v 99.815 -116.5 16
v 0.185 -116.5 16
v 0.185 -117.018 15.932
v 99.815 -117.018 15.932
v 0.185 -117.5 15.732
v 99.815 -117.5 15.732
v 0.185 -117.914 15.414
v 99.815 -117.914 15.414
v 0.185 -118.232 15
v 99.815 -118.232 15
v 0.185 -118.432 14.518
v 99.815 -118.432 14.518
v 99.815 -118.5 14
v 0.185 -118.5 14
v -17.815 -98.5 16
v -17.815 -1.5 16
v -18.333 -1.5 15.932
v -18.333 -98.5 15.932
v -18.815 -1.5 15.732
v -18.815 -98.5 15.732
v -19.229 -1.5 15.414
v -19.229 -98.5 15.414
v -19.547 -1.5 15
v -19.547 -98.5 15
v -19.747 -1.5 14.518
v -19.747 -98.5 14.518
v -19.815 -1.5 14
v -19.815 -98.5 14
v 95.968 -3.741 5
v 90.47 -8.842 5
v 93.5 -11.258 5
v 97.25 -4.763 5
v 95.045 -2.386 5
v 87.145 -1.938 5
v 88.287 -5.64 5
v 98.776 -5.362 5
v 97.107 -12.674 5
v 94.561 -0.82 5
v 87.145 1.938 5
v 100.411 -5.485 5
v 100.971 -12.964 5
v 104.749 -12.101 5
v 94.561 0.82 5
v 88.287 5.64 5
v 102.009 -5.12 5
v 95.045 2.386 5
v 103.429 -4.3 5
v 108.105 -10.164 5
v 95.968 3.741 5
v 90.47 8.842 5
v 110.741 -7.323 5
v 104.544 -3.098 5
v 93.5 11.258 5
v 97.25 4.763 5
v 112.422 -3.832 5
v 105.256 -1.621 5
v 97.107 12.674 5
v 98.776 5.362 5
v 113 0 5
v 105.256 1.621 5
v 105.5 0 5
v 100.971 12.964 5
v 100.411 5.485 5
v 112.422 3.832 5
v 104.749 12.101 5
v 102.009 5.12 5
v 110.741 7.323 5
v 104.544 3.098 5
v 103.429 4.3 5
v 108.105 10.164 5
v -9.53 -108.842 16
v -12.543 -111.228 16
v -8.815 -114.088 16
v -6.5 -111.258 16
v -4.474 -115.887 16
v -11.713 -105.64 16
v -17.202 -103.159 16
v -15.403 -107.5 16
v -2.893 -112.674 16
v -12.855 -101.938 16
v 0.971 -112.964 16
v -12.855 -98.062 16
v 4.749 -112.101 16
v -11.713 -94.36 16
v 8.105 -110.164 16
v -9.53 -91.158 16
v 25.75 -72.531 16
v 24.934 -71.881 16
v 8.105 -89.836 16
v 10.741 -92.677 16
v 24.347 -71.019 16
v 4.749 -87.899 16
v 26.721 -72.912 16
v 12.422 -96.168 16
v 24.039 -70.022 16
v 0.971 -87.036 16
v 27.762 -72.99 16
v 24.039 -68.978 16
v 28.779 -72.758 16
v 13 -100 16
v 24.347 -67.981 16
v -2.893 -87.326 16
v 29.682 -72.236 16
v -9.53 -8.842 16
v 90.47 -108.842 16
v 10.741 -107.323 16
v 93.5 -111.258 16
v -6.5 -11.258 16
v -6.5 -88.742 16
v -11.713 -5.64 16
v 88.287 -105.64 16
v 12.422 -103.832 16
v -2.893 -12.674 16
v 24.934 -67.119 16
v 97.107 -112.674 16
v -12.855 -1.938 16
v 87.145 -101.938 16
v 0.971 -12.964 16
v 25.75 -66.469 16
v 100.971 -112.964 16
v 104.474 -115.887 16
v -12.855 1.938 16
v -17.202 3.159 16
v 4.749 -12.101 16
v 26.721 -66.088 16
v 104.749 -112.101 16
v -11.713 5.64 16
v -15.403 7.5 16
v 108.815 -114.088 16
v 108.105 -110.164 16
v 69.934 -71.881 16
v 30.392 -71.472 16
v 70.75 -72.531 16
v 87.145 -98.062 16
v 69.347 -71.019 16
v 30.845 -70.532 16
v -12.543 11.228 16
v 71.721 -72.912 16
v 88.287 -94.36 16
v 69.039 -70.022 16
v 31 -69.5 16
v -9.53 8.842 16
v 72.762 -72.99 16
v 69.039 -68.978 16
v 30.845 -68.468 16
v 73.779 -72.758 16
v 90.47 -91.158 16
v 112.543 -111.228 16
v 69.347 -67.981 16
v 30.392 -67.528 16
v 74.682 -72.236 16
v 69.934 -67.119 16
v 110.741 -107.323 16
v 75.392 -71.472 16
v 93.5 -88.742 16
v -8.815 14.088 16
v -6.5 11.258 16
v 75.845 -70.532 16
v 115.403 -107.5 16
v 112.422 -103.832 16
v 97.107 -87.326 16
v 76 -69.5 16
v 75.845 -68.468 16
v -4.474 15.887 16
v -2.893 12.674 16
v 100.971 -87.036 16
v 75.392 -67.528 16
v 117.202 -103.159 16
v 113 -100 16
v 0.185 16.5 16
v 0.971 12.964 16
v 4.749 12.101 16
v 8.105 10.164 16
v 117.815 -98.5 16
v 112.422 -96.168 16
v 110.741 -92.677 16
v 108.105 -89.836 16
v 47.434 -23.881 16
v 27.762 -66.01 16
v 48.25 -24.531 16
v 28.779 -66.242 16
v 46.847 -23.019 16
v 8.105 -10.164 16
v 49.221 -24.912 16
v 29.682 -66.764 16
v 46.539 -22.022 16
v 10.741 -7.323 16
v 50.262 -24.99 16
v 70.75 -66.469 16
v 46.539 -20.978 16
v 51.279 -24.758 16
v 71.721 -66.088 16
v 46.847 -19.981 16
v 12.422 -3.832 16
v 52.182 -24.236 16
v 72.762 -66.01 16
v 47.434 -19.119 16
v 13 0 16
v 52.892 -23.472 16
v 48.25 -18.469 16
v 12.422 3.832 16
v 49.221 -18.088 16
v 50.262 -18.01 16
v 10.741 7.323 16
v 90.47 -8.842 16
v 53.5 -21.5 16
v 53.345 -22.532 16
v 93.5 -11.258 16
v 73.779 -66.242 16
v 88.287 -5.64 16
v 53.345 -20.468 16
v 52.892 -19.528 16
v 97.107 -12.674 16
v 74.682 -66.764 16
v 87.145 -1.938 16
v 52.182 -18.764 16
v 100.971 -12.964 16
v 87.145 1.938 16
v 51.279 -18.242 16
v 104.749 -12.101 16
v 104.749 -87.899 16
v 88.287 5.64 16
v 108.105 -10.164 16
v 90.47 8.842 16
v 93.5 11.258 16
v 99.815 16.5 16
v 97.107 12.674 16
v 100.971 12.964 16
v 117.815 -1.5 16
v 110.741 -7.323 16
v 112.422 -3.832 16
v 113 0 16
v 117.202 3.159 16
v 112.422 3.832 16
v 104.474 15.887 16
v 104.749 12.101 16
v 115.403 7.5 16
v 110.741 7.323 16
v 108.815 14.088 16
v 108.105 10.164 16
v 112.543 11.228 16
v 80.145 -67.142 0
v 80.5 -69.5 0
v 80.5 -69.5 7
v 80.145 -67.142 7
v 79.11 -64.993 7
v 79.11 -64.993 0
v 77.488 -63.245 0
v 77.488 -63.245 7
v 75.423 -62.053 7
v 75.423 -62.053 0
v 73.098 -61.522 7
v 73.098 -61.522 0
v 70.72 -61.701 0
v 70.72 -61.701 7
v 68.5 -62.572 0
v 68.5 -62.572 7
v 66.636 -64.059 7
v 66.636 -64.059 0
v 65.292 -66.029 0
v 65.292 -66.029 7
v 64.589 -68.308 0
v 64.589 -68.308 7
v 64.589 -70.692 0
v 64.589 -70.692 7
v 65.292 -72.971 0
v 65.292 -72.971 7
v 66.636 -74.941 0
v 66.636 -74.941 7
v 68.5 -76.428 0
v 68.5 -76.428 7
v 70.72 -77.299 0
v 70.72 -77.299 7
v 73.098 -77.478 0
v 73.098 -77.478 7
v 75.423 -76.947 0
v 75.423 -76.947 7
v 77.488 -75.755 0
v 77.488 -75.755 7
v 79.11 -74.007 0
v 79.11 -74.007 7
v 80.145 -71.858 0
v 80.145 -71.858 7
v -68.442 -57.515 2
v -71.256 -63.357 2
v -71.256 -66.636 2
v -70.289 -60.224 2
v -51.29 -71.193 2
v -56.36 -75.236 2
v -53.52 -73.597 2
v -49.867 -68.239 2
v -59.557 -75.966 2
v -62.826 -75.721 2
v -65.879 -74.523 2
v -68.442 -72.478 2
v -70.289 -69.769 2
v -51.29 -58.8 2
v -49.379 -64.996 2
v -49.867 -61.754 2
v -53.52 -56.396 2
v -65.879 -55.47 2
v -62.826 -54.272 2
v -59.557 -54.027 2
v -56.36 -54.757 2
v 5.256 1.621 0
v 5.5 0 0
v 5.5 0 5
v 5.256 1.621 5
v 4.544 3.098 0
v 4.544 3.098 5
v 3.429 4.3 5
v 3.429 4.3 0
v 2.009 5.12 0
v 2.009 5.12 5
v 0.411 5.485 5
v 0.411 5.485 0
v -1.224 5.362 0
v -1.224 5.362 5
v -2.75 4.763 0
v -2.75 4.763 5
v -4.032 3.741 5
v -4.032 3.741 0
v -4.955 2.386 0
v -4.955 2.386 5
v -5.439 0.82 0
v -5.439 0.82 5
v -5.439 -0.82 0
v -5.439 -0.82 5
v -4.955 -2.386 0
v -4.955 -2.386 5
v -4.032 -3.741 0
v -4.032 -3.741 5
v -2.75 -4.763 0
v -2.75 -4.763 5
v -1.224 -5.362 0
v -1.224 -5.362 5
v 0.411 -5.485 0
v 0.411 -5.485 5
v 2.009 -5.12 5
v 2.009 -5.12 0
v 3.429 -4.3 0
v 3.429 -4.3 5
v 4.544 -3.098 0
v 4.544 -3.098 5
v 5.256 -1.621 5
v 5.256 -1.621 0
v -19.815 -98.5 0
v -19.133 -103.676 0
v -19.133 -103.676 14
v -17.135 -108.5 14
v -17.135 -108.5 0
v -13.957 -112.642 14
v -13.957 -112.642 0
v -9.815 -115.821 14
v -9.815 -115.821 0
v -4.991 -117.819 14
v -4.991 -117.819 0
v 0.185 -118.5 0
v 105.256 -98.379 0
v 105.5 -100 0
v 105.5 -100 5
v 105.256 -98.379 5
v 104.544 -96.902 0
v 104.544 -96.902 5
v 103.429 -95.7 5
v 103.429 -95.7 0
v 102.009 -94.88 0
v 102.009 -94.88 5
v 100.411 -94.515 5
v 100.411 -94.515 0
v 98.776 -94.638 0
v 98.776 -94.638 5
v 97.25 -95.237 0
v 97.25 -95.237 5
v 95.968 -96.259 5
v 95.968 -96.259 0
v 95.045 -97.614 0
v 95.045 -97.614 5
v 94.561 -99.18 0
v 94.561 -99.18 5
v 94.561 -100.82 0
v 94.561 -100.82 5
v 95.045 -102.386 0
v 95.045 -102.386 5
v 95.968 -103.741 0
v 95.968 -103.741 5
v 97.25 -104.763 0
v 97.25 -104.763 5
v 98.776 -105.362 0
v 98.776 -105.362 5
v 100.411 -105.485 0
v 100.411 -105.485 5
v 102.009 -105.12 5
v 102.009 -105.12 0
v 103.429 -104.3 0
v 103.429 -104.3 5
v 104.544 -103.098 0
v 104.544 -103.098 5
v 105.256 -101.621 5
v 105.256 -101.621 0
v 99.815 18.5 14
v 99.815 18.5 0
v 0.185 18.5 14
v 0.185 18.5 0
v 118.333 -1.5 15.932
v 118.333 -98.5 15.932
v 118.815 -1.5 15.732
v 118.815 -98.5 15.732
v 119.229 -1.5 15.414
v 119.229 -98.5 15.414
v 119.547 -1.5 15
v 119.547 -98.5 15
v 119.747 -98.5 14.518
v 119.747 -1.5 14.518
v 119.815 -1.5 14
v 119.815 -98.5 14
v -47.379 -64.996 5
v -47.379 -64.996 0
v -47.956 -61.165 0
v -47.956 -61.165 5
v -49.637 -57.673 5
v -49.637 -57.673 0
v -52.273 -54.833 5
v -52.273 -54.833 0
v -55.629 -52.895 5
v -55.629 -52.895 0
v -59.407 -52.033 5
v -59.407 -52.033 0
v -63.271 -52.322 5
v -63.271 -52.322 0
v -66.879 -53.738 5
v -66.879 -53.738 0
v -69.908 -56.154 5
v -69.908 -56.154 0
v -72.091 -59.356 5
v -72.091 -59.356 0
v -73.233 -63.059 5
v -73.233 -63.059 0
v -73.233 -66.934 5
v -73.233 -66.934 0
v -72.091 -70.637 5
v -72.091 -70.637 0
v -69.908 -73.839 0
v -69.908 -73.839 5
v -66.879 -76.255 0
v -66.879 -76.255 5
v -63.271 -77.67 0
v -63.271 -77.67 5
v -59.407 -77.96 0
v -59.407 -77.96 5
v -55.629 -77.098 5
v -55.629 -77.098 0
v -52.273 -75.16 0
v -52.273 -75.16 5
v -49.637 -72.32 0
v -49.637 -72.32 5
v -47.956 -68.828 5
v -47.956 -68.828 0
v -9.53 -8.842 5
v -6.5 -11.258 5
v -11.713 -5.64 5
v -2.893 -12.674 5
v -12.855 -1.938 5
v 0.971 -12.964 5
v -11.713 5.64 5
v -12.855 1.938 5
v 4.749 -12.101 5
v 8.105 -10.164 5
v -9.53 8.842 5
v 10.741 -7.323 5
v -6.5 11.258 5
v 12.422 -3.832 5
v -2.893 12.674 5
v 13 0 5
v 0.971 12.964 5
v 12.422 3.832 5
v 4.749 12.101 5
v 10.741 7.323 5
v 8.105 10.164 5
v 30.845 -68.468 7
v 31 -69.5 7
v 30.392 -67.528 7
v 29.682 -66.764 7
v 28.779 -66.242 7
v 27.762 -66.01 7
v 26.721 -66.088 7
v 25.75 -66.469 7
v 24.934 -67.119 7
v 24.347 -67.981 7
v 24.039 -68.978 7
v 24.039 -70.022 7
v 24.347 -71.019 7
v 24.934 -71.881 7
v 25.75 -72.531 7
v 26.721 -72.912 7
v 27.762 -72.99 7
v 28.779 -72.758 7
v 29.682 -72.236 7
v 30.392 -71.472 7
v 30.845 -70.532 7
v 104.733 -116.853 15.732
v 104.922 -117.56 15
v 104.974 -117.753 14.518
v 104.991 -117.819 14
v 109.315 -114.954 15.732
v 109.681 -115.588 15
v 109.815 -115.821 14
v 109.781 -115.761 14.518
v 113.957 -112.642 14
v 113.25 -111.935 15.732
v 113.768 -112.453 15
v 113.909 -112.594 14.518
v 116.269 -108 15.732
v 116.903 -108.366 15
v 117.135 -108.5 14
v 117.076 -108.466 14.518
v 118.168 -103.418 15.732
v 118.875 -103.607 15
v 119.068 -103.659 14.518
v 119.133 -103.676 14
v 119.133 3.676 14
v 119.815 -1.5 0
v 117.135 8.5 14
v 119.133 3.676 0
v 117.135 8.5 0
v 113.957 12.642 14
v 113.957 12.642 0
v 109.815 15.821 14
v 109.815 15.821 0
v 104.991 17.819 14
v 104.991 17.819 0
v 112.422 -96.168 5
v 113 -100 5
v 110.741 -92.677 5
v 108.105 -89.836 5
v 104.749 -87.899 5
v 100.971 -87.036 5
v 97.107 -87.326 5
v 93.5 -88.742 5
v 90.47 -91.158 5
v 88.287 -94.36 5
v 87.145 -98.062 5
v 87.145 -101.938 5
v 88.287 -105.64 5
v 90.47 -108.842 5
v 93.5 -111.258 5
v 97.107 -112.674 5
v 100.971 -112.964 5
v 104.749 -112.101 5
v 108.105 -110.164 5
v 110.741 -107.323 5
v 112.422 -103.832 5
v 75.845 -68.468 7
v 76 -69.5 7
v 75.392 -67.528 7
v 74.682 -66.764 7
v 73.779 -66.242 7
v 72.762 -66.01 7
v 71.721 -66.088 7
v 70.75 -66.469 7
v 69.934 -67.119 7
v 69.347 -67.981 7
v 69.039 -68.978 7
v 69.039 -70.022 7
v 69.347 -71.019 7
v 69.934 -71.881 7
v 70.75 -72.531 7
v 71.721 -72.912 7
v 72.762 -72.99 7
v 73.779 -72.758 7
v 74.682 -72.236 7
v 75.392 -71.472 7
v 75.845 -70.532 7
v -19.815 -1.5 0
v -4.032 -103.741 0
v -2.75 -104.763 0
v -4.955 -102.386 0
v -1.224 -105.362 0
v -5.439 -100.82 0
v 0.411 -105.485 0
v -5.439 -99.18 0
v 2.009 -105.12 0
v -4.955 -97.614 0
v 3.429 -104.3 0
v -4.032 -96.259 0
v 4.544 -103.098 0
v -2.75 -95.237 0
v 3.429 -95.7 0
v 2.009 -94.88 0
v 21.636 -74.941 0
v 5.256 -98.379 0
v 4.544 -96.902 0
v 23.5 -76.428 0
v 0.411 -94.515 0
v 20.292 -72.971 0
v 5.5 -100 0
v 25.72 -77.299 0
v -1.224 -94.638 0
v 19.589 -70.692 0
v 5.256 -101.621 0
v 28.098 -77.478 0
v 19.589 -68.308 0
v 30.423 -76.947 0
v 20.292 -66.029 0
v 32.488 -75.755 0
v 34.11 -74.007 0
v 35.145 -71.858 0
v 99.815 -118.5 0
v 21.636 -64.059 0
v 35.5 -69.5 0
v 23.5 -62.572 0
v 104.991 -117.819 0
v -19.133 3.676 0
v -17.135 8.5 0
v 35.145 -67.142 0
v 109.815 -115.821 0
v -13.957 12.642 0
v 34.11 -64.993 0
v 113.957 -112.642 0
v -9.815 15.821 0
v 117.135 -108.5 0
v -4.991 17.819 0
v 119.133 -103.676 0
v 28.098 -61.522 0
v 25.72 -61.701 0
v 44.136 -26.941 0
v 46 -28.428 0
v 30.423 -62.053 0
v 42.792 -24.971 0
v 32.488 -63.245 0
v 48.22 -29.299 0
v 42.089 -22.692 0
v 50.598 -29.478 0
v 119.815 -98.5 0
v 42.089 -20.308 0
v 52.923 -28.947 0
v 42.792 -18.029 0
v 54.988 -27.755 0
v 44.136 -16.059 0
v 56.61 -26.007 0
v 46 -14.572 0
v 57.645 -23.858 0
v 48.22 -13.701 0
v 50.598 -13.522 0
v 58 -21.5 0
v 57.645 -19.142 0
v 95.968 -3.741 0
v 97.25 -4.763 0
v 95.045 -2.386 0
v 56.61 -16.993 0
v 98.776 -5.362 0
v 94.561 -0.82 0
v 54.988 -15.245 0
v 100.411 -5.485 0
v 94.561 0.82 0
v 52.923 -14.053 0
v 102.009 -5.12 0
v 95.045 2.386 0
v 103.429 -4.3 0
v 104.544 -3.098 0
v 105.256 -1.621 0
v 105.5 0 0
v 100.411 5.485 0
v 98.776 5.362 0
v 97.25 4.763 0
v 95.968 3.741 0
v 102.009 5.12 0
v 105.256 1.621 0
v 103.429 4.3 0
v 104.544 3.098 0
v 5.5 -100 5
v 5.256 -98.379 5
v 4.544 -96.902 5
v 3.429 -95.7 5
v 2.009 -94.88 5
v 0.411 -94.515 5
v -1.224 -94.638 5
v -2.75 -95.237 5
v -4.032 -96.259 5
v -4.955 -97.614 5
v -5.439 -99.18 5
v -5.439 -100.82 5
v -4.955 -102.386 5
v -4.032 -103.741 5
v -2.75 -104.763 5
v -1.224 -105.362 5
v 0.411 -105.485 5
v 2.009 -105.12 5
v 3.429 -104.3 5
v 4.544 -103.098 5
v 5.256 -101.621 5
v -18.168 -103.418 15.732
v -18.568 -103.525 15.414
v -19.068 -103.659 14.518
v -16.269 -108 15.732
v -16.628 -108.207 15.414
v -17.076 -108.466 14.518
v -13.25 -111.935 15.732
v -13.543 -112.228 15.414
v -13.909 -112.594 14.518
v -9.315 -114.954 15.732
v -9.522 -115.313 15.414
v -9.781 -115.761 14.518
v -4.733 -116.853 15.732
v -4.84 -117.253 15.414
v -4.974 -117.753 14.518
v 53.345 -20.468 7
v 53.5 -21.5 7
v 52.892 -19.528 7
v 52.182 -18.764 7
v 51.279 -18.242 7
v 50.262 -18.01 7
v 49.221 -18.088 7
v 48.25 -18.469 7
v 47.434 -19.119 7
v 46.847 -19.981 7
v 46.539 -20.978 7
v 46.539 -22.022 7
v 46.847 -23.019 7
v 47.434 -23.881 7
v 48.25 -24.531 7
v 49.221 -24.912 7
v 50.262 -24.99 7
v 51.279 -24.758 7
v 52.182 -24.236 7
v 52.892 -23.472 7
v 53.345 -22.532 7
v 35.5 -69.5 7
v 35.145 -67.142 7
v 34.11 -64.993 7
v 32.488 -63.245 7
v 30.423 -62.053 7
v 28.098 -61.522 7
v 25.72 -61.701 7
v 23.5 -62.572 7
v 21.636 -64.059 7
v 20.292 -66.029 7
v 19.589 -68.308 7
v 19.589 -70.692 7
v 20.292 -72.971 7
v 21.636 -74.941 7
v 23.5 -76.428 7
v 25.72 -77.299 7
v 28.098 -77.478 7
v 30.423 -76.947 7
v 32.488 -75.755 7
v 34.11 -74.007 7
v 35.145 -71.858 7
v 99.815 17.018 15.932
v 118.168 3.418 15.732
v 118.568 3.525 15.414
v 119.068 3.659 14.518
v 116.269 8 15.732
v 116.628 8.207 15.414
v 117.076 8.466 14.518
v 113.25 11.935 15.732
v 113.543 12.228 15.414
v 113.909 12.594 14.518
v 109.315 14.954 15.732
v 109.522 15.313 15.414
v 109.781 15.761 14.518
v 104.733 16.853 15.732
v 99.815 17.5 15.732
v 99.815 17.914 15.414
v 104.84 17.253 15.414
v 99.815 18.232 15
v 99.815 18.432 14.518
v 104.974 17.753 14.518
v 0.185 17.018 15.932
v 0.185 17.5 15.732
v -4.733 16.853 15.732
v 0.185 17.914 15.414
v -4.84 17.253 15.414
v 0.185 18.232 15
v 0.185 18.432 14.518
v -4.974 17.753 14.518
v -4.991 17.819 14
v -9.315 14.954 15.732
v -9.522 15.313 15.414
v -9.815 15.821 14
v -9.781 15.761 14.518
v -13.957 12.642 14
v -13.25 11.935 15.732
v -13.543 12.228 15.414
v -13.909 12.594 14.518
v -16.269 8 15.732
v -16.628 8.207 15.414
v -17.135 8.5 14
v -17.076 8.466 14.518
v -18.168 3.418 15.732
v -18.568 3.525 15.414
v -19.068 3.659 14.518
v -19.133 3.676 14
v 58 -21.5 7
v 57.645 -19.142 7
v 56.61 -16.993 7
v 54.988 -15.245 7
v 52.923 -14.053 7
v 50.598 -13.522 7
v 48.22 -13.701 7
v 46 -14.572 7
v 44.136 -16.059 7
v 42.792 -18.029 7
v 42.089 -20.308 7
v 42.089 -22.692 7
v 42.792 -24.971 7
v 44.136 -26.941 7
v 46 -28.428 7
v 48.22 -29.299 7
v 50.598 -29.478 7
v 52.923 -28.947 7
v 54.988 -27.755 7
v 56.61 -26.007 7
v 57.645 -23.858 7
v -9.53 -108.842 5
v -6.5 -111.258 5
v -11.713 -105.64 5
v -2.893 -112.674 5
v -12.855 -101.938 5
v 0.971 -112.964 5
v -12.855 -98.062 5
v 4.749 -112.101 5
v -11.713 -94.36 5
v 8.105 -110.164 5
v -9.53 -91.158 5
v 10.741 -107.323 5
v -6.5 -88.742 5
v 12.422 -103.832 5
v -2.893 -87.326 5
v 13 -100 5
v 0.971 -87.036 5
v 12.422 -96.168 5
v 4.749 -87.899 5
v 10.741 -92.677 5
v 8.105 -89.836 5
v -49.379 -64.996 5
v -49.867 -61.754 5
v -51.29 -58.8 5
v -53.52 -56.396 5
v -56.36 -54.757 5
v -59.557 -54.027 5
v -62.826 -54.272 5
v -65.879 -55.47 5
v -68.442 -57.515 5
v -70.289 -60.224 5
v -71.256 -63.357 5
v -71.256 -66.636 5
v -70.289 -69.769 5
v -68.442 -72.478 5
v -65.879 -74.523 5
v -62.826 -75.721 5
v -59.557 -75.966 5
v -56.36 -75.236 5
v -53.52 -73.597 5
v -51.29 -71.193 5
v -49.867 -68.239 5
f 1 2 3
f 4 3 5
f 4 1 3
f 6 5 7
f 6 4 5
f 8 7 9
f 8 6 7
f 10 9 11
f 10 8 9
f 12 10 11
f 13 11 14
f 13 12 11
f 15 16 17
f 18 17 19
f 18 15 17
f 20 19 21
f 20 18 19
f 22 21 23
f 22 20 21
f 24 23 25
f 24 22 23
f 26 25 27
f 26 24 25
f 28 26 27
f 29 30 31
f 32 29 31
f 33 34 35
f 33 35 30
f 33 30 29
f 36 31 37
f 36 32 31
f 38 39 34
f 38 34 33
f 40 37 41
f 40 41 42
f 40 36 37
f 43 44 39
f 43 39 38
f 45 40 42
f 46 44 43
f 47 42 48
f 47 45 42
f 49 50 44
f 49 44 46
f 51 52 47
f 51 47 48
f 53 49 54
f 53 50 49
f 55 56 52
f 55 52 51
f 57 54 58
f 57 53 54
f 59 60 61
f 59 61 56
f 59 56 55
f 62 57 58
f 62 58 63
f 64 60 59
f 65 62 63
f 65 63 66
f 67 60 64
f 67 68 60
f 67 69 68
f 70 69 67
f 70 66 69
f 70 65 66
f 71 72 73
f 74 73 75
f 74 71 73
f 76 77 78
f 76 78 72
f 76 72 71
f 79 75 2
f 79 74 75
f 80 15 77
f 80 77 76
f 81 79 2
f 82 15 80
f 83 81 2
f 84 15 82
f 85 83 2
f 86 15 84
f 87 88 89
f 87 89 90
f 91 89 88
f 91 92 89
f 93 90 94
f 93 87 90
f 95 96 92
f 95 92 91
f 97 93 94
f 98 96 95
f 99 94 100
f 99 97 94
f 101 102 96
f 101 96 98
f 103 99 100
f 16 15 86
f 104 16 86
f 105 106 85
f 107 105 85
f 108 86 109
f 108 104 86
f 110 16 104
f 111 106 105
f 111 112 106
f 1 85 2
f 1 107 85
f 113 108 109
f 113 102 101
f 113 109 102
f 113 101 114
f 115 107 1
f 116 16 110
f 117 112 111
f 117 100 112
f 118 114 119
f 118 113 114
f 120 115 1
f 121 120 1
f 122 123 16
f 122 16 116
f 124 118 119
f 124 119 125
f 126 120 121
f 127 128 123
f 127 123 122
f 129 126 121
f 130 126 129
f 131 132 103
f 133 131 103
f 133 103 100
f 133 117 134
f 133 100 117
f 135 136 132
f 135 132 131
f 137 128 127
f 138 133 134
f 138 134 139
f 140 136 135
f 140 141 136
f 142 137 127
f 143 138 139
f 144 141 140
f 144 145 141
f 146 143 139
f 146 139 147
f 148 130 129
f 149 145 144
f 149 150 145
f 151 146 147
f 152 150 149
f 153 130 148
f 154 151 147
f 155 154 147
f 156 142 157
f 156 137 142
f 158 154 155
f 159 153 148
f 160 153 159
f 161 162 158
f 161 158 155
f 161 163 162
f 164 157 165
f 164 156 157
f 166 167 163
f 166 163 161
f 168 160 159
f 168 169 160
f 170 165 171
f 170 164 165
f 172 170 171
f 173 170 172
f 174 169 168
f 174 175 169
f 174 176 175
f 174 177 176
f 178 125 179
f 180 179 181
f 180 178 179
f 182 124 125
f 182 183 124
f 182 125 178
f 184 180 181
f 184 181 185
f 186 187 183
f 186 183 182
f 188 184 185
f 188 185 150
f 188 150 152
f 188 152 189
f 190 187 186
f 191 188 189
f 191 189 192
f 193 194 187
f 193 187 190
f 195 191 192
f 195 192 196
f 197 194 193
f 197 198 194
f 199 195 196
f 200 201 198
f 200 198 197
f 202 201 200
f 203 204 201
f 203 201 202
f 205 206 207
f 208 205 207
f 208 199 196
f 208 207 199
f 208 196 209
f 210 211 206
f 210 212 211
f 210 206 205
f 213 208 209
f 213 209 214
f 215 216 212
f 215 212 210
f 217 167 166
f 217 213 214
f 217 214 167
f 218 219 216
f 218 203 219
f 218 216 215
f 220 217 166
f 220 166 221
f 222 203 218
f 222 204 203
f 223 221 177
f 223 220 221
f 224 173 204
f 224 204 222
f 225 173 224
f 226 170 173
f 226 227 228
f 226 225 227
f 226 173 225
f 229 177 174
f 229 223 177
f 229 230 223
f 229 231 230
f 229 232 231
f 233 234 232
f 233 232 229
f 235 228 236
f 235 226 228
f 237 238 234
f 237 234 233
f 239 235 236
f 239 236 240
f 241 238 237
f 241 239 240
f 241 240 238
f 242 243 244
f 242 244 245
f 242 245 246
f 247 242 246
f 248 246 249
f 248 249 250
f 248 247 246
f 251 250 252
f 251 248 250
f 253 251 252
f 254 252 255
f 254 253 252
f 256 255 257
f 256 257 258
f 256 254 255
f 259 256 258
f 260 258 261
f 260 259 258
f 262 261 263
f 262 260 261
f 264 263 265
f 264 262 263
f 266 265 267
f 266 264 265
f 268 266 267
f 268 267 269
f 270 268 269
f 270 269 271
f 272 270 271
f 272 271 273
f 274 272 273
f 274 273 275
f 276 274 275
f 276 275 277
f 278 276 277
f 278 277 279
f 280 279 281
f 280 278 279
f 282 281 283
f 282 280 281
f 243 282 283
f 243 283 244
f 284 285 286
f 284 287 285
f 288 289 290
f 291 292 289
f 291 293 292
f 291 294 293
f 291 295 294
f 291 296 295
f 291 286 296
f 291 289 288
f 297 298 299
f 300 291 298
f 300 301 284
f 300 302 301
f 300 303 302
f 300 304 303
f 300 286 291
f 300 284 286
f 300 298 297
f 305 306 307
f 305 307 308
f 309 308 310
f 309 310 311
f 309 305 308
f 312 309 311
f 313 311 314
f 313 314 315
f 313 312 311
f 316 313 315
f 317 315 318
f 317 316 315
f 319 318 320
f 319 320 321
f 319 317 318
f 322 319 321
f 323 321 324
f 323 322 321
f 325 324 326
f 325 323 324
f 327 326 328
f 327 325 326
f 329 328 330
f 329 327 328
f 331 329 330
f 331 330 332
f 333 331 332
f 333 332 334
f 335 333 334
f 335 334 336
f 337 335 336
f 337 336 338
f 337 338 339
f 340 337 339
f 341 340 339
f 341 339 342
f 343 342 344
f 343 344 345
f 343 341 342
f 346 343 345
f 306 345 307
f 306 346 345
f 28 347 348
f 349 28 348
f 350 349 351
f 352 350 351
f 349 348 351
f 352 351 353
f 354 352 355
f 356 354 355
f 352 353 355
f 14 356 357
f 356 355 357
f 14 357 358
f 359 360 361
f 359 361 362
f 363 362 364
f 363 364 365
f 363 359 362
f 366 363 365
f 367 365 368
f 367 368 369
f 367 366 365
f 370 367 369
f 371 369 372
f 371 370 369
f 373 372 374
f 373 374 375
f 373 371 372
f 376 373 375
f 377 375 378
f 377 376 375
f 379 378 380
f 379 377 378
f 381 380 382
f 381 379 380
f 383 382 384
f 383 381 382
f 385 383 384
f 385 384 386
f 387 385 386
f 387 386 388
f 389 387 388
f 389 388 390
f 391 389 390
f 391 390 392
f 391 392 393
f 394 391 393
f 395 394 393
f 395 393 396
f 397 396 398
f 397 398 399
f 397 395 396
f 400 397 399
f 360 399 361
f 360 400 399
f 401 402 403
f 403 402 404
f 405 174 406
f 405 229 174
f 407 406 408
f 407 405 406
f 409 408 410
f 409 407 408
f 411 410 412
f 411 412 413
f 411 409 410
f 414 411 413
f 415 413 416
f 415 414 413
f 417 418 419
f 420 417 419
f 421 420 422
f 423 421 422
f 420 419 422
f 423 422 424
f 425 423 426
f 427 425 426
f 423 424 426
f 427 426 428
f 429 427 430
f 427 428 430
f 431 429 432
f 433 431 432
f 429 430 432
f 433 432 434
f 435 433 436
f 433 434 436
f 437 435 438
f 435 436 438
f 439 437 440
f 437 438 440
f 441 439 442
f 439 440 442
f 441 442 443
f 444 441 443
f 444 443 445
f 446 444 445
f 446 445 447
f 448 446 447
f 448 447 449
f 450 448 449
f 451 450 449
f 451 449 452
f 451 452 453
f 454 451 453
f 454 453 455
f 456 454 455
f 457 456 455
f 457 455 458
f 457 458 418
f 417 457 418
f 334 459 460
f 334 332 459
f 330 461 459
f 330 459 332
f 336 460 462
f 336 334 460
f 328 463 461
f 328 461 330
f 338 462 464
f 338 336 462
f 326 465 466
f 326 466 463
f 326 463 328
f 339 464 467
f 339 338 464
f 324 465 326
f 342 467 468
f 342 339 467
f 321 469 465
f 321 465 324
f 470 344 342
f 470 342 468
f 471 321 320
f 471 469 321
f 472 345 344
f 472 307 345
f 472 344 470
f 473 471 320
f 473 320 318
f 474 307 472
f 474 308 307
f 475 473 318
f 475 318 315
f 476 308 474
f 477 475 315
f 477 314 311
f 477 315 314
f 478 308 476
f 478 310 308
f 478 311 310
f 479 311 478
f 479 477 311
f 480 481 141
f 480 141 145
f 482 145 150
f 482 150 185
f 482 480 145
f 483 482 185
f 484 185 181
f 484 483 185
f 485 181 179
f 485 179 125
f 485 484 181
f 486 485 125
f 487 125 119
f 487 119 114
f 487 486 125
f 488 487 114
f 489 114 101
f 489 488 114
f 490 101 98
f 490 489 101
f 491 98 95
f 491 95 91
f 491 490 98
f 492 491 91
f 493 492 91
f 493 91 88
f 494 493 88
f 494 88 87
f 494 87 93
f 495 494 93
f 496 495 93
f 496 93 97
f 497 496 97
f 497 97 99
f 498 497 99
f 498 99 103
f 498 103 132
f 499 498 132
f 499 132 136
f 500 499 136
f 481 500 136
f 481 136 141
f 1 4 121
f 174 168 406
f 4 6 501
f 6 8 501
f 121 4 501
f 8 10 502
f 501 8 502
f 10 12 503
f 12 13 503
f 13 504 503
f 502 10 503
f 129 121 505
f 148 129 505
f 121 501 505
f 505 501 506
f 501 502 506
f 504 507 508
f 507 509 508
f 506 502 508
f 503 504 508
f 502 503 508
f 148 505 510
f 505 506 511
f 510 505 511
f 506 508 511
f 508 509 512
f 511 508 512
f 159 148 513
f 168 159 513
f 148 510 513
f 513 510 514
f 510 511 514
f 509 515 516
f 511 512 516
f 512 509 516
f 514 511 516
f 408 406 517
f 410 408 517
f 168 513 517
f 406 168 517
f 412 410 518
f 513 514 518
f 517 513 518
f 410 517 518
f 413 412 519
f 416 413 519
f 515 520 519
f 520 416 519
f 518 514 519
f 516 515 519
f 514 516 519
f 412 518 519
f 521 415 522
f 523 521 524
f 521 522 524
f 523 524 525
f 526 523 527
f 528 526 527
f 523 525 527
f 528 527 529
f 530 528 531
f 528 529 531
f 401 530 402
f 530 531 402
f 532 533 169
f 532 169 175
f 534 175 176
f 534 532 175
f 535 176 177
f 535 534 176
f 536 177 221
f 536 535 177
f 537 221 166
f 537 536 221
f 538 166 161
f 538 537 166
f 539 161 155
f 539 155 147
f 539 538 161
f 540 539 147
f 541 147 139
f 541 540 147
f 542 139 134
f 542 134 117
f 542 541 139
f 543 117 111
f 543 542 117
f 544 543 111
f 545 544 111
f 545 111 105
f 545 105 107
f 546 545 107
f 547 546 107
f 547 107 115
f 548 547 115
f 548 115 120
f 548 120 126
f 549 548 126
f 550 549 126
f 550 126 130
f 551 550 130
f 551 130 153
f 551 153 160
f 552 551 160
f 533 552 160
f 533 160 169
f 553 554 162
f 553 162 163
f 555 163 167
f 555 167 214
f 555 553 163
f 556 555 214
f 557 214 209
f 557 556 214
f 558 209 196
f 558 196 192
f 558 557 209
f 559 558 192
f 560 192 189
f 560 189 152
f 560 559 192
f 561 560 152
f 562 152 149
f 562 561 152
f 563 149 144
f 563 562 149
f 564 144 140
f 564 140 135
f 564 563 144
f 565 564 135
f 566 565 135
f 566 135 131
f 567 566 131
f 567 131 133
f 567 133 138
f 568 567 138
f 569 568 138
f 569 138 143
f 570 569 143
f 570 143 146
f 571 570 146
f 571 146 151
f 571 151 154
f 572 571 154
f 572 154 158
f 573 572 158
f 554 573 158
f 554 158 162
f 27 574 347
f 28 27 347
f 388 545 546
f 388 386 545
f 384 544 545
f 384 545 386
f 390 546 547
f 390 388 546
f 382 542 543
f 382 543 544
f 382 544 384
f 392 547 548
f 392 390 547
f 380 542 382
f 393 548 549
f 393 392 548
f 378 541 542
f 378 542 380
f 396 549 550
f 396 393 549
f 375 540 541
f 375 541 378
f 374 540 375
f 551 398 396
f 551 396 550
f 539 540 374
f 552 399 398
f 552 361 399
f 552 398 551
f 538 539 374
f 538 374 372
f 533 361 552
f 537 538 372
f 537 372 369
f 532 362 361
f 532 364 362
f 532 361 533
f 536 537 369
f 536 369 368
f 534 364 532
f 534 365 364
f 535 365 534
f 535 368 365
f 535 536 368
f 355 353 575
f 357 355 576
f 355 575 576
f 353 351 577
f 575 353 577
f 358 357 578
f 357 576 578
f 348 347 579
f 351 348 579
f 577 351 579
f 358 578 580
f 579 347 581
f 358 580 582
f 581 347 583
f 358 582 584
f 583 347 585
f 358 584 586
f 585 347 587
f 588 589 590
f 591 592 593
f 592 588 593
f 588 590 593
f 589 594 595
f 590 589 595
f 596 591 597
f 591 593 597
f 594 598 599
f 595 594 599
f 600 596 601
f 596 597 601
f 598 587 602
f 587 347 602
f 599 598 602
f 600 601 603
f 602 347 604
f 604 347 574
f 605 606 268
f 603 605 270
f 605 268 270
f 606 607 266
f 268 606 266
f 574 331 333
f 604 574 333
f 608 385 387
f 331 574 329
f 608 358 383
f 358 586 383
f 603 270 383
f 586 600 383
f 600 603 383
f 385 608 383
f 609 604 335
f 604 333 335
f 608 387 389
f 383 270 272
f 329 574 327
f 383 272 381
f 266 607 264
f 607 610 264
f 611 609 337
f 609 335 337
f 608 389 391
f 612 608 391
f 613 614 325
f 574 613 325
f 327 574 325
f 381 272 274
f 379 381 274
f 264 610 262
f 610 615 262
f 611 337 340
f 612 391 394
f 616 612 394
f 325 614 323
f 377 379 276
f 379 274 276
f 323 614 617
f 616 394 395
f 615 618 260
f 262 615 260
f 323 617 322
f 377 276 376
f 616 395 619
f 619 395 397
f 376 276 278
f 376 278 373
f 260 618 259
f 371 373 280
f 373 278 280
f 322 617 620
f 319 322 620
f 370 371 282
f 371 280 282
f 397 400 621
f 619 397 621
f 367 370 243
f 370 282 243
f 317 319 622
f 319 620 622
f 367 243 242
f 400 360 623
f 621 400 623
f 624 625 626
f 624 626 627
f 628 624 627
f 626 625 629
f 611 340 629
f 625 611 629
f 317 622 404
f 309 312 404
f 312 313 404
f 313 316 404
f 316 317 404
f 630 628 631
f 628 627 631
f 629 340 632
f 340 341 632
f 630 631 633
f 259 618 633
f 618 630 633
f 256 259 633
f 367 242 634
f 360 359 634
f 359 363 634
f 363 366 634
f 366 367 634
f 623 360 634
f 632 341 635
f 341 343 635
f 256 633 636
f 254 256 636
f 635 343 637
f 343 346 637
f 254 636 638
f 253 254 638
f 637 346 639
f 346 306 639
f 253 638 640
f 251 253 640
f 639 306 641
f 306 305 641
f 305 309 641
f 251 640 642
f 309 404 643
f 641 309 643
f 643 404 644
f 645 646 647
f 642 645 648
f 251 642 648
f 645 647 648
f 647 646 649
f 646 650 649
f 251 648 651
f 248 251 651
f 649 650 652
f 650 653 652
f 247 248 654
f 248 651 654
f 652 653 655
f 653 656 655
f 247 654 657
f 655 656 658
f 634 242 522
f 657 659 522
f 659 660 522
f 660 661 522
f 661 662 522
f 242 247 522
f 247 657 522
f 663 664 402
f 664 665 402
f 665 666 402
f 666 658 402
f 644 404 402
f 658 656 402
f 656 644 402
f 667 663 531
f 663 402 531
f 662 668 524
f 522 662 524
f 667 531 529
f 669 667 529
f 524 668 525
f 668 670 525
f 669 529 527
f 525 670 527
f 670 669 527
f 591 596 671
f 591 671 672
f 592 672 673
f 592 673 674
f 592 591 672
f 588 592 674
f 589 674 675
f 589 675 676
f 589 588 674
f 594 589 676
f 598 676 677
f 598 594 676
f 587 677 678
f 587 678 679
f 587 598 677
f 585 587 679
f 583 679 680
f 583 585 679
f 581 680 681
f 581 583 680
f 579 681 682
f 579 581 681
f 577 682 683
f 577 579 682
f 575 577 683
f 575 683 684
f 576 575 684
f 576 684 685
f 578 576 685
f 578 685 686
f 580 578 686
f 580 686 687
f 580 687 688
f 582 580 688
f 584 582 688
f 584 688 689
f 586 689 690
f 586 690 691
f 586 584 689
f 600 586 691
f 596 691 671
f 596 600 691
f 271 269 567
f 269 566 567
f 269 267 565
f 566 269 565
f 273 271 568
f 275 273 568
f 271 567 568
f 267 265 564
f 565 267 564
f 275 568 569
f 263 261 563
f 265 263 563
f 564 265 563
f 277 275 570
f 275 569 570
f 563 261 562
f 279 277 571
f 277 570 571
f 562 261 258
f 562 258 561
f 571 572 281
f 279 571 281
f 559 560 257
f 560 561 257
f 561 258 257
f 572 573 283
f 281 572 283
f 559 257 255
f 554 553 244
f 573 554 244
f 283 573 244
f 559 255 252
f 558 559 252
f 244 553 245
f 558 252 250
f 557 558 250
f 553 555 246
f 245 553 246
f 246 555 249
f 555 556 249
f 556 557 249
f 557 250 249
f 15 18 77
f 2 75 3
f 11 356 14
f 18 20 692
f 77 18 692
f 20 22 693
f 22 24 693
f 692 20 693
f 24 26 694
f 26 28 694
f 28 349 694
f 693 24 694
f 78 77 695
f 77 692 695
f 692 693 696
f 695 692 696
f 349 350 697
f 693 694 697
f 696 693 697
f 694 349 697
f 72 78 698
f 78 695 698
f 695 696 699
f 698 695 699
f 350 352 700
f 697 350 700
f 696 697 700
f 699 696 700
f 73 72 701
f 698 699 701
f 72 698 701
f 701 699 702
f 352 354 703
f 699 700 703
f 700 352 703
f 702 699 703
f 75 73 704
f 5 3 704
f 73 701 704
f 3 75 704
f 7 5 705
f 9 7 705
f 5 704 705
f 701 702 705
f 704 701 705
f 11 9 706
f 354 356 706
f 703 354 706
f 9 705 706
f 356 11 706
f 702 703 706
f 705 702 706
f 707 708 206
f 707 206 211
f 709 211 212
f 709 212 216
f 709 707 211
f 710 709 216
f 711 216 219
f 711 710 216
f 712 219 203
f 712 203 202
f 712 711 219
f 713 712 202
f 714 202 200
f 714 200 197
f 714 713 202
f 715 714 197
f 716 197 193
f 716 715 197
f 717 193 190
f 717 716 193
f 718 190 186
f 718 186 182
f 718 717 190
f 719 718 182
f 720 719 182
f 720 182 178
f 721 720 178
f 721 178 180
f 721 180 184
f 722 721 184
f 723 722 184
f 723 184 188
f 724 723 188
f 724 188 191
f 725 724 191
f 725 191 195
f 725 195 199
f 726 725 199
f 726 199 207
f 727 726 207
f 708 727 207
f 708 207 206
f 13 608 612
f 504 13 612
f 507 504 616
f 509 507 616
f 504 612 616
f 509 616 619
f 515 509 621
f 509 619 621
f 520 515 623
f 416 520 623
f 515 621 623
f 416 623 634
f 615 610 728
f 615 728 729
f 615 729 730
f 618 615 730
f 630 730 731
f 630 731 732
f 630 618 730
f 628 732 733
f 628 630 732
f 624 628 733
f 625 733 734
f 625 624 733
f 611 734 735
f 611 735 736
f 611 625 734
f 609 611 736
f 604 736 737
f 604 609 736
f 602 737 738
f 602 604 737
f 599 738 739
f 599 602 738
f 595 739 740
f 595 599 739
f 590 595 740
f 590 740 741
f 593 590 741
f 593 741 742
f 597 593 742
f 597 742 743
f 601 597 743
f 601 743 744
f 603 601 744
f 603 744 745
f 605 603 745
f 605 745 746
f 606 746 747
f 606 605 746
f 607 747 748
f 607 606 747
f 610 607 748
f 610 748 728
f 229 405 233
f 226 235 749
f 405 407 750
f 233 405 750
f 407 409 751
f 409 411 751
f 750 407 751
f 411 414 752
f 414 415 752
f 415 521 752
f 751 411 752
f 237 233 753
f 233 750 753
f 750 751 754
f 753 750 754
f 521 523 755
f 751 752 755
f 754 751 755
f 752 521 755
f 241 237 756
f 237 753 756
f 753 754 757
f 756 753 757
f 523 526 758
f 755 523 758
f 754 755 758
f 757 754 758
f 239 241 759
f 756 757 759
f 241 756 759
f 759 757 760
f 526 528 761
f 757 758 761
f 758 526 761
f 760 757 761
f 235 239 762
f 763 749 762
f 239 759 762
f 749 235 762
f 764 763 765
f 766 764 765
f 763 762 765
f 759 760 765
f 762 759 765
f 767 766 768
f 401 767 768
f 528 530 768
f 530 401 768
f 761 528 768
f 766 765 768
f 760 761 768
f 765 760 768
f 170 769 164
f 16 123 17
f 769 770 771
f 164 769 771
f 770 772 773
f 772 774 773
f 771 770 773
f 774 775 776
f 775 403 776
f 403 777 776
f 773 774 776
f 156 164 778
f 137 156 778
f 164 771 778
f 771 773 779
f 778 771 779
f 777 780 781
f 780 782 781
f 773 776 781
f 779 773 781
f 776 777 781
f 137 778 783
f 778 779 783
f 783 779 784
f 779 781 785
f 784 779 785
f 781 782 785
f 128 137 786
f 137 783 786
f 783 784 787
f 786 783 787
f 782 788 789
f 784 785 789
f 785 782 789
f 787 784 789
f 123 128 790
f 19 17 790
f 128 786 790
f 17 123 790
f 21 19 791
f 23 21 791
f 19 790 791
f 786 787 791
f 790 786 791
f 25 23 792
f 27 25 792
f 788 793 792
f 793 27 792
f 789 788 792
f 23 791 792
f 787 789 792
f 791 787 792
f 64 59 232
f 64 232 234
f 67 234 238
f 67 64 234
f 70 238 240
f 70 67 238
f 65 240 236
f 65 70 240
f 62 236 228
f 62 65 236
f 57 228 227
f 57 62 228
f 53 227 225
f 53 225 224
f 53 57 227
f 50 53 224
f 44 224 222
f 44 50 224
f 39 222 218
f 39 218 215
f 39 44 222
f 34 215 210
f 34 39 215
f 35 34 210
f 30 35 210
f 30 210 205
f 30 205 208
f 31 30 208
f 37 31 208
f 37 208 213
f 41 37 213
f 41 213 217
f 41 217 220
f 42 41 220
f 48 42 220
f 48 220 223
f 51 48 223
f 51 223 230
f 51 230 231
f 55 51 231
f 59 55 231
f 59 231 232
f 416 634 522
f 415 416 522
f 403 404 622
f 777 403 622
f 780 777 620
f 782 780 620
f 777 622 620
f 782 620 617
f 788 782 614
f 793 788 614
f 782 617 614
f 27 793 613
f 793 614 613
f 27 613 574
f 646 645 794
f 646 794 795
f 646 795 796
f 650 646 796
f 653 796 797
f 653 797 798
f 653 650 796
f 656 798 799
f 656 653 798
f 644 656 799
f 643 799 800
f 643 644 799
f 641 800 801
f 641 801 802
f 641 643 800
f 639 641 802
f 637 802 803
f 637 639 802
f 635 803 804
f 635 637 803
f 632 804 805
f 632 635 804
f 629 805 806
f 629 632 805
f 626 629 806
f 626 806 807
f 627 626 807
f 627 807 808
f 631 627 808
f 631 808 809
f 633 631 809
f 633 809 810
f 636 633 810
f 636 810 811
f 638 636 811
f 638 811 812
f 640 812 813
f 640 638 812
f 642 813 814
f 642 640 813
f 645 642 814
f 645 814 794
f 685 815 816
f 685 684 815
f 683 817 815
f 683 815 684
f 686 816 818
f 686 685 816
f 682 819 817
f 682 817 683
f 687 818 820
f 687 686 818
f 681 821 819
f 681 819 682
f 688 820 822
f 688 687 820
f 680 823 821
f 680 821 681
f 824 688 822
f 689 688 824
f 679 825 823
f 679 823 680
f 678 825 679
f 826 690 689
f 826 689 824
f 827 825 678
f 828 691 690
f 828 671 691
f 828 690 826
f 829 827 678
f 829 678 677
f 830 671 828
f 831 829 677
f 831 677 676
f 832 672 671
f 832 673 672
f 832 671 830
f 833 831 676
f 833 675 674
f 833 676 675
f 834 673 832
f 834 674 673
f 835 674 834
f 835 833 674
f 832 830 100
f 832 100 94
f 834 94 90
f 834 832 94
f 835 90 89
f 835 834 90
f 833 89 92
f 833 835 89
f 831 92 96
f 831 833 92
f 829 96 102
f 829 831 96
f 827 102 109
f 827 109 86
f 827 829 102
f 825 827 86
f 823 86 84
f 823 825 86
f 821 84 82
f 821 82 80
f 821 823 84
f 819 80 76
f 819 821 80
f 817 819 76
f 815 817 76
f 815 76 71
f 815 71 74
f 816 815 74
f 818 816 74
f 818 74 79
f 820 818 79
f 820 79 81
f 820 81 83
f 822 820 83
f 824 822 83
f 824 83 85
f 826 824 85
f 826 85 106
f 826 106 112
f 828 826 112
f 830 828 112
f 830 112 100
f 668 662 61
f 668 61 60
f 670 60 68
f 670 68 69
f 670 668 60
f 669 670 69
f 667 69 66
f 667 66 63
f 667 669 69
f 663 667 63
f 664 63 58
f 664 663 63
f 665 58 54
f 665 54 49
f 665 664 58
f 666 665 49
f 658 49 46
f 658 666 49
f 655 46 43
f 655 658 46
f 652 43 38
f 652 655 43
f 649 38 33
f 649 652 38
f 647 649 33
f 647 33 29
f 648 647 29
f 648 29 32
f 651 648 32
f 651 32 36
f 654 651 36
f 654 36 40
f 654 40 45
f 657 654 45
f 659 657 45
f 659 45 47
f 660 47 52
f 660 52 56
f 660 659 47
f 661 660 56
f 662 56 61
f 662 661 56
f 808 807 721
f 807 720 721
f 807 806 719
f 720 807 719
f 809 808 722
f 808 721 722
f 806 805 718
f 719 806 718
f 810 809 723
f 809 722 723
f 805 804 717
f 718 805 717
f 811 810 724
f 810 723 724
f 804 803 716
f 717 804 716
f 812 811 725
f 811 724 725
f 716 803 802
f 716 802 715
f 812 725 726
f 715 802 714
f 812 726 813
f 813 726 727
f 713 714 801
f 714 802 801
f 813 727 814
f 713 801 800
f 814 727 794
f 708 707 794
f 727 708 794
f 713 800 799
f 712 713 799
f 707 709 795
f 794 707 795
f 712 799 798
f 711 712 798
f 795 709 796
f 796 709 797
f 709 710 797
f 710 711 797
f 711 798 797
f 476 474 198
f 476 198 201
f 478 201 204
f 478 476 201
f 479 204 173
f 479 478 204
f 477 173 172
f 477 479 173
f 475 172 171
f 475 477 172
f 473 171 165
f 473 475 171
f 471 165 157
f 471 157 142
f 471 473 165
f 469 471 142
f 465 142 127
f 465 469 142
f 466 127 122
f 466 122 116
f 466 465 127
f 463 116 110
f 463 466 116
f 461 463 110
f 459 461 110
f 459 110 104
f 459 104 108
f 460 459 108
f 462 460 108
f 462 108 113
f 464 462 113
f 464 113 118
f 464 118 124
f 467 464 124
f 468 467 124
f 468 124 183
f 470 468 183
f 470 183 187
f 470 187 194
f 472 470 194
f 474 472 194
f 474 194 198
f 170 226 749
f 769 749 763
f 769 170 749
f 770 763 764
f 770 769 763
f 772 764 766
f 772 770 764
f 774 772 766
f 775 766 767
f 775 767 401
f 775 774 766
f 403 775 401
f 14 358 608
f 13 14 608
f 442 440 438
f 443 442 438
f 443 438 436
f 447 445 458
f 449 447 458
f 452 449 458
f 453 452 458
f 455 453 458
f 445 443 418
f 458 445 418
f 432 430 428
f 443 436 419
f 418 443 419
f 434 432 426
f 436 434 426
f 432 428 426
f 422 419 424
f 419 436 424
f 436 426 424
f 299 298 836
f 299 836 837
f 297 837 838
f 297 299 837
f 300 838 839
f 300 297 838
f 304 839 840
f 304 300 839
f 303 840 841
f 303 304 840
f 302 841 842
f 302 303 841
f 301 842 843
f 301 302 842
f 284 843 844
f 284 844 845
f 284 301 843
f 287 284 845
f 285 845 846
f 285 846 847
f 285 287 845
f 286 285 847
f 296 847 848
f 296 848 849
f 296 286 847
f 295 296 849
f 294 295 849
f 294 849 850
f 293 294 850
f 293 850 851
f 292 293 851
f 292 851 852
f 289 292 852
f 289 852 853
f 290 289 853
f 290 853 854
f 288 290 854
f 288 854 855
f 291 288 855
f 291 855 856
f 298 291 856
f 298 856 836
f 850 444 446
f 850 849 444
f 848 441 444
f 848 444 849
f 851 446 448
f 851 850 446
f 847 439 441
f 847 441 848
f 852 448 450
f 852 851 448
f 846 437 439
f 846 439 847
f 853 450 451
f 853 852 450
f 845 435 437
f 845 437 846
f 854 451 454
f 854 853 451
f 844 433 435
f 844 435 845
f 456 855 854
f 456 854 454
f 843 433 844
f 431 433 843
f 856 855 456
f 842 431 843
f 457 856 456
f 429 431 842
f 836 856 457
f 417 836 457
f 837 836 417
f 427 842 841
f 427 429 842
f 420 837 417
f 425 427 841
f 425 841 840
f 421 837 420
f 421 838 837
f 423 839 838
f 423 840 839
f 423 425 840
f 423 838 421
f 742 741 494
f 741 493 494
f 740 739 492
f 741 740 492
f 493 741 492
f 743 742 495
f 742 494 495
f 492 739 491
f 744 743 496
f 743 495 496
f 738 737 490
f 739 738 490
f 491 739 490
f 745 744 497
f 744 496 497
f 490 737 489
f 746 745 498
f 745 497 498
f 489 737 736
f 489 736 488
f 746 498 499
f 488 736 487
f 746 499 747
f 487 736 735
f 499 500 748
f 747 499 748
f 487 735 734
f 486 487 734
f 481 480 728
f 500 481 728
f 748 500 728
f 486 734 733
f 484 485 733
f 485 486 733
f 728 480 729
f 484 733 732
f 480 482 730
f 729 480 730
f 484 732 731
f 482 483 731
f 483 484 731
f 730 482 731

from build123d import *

# Parameters (mm, degrees)
F0_R     = 13
F0_R_2   = 8
F0_R_3   = 3.5
F1_DEPTH = 16
F2_DEPTH = 7
F3_DEPTH = 16
F4_R     = 2
F0_R_4   = 5.5
F5_DEPTH = 5
F0_R_5   = 11
F6_DEPTH = 2
F7_DEPTH = 5


# Not quite as in the source:
# - a feature names something its author has since deleted; it is built from what else it names


with BuildPart() as f1:
    # F0 (on Top) → F1 (new body)
    with BuildSketch(Plane.XY):
        with BuildLine():
            Line((99.8149545762, 18.5), (0.1850454238, 18.5))
            ThreePointArc((0.1850454238, 18.5), (-13.9570902, 12.6421356237), (-19.8149545762, -1.5))
            Line((-19.8149545762, -1.5), (-19.8149545762, -98.5))
            ThreePointArc((-19.8149545762, -98.5), (-13.9570902, -112.6421356237), (0.1850454238, -118.5))
            Line((0.1850454238, -118.5), (99.8149545762, -118.5))
            ThreePointArc((99.8149545762, -118.5), (113.9570902, -112.6421356237), (119.8149545762, -98.5))
            Line((119.8149545762, -98.5), (119.8149545762, -1.5))
            ThreePointArc((119.8149545762, -1.5), (113.9570902, 12.6421356237), (99.8149545762, 18.5))
        make_face()
        with Locations((0, -100)):
            Circle(F0_R, mode=Mode.SUBTRACT)
        with Locations((100, -100)):
            Circle(F0_R, mode=Mode.SUBTRACT)
        with Locations((27.5, -69.5)):
            Circle(F0_R_2, mode=Mode.SUBTRACT)
        with Locations((72.5, -69.5)):
            Circle(F0_R_2, mode=Mode.SUBTRACT)
        Circle(F0_R, mode=Mode.SUBTRACT)
        with Locations((50, -21.5)):
            Circle(F0_R_2, mode=Mode.SUBTRACT)
        with Locations((100, 0)):
            Circle(F0_R, mode=Mode.SUBTRACT)
        with Locations((50, -21.5)):
            Circle(F0_R_2)
        with Locations((50, -21.5)):
            Circle(F0_R_3, mode=Mode.SUBTRACT)
        with Locations((72.5, -69.5)):
            Circle(F0_R_2)
        with Locations((72.5, -69.5)):
            Circle(F0_R_3, mode=Mode.SUBTRACT)
        with Locations((27.5, -69.5)):
            Circle(F0_R_2)
        with Locations((27.5, -69.5)):
            Circle(F0_R_3, mode=Mode.SUBTRACT)
        with Locations((50, -21.5)):
            Circle(F0_R_3)
        with Locations((72.5, -69.5)):
            Circle(F0_R_3)
        with Locations((27.5, -69.5)):
            Circle(F0_R_3)
    extrude(amount=F1_DEPTH)

    # F0 (on Top) → F2 (cut)
    with BuildSketch(Plane.XY):
        with Locations((72.5, -69.5)):
            Circle(F0_R_2)
        with Locations((72.5, -69.5)):
            Circle(F0_R_3, mode=Mode.SUBTRACT)
        with Locations((27.5, -69.5)):
            Circle(F0_R_2)
        with Locations((27.5, -69.5)):
            Circle(F0_R_3, mode=Mode.SUBTRACT)
        with Locations((50, -21.5)):
            Circle(F0_R_2)
        with Locations((50, -21.5)):
            Circle(F0_R_3, mode=Mode.SUBTRACT)
    extrude(amount=F2_DEPTH, mode=Mode.SUBTRACT)

    # F0 (on Top) → F3 (cut, through all)
    with BuildSketch(Plane.XY):
        with Locations((27.5, -69.5)):
            Circle(F0_R_3)
        with Locations((72.5, -69.5)):
            Circle(F0_R_3)
        with Locations((50, -21.5)):
            Circle(F0_R_3)
    extrude(amount=F3_DEPTH, mode=Mode.SUBTRACT)

    # F4
    f4_edges = [f1.edges().sort_by_distance(p)[0] for p in [
        (119.814955, -50, 16),
    ]]
    fillet(f4_edges, radius=F4_R)

    # F0 (on Top) → F5 (join)
    with BuildSketch(Plane.XY):
        with Locations((100, 0)):
            Circle(F0_R)
        with Locations((100, 0)):
            Circle(F0_R_4, mode=Mode.SUBTRACT)
        with Locations((100, -100)):
            Circle(F0_R)
        with Locations((100, -100)):
            Circle(F0_R_4, mode=Mode.SUBTRACT)
        with Locations((0, -100)):
            Circle(F0_R)
        with Locations((0, -100)):
            Circle(F0_R_4, mode=Mode.SUBTRACT)
        Circle(F0_R)
        Circle(F0_R_4, mode=Mode.SUBTRACT)
    extrude(amount=F5_DEPTH)


with BuildPart() as f6:
    # F0 (on Top) → F6 (new body)
    with BuildSketch(Plane.XY):
        with Locations((-60.3785477579, -64.9964138865)):
            Circle(F0_R)
        with Locations((-60.3785477579, -64.9964138865)):
            Circle(F0_R_5, mode=Mode.SUBTRACT)
        with Locations((-60.3785477579, -64.9964138865)):
            Circle(F0_R_5)
    extrude(amount=F6_DEPTH)

    # F0 (on Top) → F7 (join)
    with BuildSketch(Plane.XY):
        with Locations((-60.3785477579, -64.9964138865)):
            Circle(F0_R)
        with Locations((-60.3785477579, -64.9964138865)):
            Circle(F0_R_5, mode=Mode.SUBTRACT)
    extrude(amount=F7_DEPTH)


solid = Compound([f1.part, f6.part])
